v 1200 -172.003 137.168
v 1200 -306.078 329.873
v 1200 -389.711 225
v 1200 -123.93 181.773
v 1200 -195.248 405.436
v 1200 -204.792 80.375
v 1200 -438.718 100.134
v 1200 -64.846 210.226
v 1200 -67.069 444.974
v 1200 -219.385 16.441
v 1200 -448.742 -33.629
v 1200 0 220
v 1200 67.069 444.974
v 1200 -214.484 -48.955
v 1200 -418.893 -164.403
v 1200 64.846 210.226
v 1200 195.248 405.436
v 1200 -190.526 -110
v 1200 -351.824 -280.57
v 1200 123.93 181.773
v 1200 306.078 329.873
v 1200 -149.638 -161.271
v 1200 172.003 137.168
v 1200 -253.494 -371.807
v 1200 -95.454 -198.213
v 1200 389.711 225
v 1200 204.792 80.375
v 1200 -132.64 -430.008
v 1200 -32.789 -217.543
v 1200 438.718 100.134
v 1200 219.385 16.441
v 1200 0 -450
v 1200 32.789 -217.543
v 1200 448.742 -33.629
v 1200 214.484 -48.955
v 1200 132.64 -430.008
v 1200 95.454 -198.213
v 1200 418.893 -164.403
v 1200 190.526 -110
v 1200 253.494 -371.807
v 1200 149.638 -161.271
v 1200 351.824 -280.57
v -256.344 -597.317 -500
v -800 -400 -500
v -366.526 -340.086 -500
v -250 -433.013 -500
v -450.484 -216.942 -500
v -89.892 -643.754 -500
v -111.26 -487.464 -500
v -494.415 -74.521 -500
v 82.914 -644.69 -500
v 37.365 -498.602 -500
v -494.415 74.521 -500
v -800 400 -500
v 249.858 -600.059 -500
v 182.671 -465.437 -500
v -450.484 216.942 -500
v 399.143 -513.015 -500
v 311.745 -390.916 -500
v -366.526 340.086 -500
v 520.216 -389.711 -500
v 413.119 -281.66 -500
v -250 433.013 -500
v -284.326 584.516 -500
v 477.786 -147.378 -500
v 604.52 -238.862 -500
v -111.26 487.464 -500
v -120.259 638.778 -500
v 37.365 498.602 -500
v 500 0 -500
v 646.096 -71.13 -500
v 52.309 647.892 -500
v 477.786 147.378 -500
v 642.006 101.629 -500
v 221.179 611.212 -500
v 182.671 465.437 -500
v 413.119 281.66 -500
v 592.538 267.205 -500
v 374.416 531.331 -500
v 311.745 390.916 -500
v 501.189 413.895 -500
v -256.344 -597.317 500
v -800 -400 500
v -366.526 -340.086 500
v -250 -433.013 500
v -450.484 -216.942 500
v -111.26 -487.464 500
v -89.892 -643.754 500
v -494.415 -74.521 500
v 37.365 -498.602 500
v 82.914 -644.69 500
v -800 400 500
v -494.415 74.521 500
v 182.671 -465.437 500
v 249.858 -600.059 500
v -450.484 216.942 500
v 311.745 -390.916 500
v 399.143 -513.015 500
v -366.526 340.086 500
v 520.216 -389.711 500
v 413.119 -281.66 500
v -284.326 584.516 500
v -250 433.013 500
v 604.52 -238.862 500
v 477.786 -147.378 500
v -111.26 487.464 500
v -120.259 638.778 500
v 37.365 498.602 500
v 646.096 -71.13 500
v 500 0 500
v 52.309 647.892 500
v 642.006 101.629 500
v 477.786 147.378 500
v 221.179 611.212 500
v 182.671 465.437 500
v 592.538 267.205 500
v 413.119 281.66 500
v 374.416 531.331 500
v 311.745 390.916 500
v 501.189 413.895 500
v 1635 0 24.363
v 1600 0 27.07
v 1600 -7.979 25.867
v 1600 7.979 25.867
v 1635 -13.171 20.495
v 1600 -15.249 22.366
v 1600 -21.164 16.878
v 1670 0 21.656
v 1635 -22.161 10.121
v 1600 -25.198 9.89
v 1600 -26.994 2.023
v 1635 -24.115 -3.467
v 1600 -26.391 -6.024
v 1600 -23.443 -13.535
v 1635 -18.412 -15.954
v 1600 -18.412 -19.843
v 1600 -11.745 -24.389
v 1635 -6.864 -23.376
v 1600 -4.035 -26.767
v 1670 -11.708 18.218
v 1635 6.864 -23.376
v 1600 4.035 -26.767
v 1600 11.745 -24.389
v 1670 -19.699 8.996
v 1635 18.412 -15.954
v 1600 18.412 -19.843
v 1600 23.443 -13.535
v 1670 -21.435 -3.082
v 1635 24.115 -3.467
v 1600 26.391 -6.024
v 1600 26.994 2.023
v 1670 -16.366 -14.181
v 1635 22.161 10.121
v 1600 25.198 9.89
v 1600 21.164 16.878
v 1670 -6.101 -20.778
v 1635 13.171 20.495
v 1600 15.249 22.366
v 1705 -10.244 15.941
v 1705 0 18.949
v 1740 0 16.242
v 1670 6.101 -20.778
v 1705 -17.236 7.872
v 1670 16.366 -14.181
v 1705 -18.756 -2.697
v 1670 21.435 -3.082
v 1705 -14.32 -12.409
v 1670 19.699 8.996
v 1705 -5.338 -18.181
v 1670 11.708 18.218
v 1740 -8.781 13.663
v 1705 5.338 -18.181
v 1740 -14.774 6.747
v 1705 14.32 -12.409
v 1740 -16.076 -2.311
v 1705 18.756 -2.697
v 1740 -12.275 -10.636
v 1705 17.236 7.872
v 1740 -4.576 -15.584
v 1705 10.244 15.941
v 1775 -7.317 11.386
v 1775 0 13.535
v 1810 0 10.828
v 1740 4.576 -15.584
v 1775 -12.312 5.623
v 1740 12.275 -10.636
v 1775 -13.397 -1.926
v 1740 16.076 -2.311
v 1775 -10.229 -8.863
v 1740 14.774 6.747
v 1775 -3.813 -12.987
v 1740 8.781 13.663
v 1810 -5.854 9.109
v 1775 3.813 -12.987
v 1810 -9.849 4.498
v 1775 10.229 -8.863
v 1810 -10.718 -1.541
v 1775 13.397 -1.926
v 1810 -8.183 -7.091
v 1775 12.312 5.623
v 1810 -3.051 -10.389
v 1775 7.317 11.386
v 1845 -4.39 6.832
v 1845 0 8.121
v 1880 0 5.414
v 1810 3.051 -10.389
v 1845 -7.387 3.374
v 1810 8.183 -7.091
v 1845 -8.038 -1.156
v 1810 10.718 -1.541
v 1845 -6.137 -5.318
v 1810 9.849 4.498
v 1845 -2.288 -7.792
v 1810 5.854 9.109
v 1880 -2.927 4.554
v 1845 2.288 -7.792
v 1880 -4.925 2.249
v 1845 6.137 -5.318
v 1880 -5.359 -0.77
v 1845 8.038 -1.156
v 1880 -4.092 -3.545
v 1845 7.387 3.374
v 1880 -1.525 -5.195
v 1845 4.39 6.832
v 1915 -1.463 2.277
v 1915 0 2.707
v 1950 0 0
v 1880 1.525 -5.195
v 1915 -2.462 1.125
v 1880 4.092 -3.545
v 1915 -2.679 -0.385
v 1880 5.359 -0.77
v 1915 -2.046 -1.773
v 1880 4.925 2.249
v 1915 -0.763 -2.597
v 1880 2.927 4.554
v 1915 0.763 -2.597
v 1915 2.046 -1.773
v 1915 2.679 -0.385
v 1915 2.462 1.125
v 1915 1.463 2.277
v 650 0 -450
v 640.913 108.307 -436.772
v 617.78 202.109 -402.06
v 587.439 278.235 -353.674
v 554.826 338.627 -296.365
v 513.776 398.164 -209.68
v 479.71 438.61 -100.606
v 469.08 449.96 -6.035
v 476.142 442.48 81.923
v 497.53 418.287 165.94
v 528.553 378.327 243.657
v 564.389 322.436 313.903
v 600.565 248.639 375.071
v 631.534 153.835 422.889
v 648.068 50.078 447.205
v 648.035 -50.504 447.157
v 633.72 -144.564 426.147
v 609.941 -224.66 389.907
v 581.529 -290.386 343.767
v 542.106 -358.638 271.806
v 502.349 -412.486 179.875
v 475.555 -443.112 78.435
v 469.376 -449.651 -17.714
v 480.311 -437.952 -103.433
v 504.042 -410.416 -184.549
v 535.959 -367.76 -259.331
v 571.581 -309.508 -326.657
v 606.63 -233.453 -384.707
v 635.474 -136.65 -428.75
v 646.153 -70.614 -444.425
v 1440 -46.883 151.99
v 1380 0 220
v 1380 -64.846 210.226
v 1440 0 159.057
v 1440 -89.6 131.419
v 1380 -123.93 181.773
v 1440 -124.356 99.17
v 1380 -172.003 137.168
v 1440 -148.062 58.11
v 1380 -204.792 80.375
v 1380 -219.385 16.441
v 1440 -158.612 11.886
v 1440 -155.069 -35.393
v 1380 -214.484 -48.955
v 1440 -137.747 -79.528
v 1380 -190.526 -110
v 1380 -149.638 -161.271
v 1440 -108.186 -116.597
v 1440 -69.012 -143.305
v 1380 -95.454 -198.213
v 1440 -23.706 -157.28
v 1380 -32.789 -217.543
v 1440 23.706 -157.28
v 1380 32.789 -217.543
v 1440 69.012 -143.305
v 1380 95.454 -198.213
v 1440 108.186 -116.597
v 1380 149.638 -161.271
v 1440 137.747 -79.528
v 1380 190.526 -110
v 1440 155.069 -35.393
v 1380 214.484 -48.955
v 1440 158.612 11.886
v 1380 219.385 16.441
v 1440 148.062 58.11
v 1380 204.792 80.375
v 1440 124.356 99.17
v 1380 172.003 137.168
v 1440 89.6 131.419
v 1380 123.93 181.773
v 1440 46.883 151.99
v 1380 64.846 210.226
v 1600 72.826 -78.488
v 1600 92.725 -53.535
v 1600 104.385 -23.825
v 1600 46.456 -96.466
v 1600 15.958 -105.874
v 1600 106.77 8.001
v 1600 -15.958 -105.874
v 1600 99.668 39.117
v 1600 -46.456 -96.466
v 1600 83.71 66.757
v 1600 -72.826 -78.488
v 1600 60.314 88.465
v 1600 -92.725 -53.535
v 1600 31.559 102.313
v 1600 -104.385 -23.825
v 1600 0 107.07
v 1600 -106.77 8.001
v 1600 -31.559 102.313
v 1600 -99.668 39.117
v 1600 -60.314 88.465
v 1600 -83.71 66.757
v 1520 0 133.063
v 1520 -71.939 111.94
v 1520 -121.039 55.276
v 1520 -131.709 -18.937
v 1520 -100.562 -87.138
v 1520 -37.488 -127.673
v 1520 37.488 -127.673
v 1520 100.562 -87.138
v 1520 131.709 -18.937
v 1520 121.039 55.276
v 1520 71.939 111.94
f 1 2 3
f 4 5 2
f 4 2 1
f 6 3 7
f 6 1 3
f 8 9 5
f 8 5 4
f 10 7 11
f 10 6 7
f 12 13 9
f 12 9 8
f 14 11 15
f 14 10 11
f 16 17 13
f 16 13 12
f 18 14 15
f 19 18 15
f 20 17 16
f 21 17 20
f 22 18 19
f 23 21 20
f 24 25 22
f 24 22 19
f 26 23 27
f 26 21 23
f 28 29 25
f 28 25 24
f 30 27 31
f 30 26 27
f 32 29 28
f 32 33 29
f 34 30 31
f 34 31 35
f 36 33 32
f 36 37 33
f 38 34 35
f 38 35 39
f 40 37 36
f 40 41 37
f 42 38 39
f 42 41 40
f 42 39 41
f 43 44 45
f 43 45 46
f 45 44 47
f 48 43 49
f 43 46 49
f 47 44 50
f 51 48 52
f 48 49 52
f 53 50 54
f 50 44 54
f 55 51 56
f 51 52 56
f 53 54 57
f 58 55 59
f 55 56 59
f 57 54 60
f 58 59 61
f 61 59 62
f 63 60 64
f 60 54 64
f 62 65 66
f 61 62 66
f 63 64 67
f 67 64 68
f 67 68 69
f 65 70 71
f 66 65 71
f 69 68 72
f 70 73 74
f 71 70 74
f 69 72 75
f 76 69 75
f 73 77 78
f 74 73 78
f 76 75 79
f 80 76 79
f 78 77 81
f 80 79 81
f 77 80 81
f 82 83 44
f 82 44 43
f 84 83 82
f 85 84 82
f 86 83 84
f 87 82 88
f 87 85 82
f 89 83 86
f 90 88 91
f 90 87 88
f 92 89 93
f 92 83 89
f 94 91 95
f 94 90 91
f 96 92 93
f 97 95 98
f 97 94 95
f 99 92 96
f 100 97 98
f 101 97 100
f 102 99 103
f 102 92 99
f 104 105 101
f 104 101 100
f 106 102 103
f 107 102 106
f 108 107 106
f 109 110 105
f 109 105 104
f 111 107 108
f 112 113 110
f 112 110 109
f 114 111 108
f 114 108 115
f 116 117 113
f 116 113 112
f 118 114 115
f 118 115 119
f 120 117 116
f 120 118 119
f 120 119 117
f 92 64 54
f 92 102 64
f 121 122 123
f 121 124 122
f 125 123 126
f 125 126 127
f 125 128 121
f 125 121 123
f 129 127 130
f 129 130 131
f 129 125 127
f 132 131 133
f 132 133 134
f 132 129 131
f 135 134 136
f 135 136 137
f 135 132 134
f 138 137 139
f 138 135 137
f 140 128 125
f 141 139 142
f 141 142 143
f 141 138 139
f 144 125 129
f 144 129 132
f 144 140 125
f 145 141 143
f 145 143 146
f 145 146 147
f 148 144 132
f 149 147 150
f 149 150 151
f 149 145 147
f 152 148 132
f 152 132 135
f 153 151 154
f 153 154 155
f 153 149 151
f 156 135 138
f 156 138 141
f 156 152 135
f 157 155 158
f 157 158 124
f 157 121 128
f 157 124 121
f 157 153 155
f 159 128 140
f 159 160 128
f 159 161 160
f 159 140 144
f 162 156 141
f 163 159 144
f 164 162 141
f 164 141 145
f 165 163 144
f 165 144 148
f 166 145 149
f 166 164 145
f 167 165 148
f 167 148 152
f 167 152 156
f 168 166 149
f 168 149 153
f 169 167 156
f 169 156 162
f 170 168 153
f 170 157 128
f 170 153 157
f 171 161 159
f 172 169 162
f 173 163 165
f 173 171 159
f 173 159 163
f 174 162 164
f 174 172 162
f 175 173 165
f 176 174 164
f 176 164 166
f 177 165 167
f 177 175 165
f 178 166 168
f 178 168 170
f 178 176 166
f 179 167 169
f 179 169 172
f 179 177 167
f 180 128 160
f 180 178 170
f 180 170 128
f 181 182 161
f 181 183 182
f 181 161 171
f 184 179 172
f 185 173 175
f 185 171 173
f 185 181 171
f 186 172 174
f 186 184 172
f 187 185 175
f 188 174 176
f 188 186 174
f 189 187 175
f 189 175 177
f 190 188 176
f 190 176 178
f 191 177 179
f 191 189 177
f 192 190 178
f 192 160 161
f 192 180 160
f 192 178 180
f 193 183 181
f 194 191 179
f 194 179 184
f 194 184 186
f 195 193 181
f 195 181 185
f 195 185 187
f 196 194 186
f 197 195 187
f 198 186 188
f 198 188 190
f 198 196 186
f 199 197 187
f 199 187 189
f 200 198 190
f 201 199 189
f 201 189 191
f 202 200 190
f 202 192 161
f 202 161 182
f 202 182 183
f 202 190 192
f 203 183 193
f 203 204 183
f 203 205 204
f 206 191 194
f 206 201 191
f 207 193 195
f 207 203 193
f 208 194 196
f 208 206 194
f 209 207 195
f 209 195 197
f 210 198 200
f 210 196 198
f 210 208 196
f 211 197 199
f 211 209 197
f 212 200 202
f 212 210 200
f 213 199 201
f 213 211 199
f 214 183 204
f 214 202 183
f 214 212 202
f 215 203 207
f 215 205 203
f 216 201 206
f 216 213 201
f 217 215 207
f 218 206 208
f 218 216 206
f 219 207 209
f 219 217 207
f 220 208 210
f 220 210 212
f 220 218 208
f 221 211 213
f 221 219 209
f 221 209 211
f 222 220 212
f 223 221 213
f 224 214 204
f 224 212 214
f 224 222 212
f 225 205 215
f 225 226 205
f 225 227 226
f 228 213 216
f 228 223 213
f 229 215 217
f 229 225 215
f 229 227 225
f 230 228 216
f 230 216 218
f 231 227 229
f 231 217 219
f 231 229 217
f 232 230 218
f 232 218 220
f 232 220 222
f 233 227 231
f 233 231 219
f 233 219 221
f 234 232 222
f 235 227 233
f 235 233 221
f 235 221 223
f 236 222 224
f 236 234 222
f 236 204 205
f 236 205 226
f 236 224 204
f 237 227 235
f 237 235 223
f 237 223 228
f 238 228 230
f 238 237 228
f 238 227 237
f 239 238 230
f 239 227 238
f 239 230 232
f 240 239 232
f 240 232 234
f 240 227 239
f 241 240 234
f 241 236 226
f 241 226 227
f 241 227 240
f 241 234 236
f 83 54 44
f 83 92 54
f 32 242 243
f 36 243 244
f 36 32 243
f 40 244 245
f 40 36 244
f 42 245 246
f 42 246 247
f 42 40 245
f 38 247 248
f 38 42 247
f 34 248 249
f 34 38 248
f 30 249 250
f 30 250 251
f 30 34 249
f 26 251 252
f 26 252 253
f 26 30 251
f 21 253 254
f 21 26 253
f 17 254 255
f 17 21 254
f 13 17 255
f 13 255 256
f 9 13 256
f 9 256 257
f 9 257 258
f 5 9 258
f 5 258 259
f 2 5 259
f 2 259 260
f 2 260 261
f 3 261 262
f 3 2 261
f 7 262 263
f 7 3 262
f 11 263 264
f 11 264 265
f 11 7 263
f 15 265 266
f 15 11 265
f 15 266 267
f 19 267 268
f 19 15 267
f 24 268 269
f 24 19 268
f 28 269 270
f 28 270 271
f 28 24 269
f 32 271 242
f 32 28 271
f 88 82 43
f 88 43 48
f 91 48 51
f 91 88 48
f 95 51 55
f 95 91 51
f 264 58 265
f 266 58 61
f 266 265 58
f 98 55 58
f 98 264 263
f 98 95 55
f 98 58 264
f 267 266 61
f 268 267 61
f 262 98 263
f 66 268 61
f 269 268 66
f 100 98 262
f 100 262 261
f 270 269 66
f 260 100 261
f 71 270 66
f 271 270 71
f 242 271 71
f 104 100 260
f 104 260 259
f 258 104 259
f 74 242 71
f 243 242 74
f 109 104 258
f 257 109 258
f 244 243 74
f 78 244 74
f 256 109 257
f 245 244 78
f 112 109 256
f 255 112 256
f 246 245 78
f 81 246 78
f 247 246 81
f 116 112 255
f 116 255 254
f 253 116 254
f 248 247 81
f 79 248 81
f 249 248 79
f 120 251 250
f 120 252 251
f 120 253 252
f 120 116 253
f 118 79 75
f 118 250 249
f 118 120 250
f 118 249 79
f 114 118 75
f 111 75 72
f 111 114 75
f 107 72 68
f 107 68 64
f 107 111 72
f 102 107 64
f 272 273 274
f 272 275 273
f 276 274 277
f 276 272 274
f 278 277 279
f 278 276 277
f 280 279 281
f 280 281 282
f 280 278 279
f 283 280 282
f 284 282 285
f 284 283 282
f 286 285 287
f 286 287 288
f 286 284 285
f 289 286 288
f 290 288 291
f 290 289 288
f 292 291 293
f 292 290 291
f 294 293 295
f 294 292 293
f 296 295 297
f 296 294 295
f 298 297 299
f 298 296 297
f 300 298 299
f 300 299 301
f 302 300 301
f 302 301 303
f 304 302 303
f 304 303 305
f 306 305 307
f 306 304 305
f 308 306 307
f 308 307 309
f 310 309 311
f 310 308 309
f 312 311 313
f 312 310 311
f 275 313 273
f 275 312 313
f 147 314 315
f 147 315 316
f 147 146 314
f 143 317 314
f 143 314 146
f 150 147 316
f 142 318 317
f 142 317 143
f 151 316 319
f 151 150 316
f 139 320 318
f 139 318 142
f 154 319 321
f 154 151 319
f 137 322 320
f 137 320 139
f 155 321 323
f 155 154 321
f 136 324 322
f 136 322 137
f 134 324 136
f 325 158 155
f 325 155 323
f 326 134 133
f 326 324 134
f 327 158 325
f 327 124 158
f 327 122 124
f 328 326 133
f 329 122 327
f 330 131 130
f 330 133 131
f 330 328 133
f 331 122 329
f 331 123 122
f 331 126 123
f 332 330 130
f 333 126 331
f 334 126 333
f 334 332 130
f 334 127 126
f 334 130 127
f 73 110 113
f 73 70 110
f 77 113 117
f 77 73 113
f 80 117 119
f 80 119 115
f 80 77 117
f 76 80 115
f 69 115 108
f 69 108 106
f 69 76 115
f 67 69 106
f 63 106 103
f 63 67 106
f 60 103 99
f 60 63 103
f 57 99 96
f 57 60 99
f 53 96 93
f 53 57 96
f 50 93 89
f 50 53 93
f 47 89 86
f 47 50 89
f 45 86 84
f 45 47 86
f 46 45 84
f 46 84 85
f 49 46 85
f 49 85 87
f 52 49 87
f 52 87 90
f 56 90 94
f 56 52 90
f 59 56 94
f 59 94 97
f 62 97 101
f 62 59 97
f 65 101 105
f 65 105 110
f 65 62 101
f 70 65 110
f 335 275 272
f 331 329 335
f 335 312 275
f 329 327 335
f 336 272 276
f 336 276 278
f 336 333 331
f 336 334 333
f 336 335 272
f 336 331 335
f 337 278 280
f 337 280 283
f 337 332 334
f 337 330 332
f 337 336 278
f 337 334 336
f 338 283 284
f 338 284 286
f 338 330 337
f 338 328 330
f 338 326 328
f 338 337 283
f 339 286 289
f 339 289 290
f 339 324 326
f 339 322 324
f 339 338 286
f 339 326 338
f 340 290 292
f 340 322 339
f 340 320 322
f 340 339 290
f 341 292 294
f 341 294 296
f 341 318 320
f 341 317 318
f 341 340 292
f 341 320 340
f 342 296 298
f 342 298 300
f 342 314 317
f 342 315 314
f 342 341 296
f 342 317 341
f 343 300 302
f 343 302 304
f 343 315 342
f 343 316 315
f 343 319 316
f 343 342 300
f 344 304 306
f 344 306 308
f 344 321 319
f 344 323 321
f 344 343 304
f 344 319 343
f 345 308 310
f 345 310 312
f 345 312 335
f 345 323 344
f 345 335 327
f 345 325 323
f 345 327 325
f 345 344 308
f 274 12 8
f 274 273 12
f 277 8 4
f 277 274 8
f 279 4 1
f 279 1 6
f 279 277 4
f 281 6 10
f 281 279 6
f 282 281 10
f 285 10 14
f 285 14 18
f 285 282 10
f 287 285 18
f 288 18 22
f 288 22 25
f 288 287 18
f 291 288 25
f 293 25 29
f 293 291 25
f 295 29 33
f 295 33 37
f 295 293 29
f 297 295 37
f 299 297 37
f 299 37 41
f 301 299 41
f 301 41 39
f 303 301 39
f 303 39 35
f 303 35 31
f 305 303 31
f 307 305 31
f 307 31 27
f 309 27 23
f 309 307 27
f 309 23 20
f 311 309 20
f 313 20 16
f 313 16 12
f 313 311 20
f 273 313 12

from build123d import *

# Parameters (mm, degrees)
SKETCH1_R                = 500
BOSS_EXTRUDE1_DEPTH      = 500
BOSS_EXTRUDE2_REACH      = 2163.597
BOSS_EXTRUDE2_END_RADIUS = 650
SKETCH2_R                = 450


with BuildPart() as part:
    # Sketch1 → Boss-Extrude1 (new, symmetric)
    with BuildSketch(Plane.XY):
        with BuildLine():
            Line((-800, 400), (-800, -400))
            Line((-800, -400), (-256.343570219, -597.317314338))
            ThreePointArc((-256.343570219, -597.317314338), (649.817878656, 15.385856465), (-284.326048032, 584.515781147))
            Line((-284.326048032, 584.515781147), (-800, 400))
        make_face()
        Circle(SKETCH1_R, mode=Mode.SUBTRACT)
    extrude(amount=BOSS_EXTRUDE1_DEPTH, both=True)

    # Boss-Extrude2: up to this cylinder (the profile starts outside it)
    boss_extrude2_end = Plane(origin=(0, 0, 0), z_dir=(0, 0, -1)) * Cylinder(BOSS_EXTRUDE2_END_RADIUS, 5628.194, mode=Mode.PRIVATE)
    # Sketch2 → Boss-Extrude2 (add, up to the surface)
    with BuildSketch(Plane(origin=(1200, 0, 0), x_dir=(0, 0, -1), z_dir=(1, 0, 0)), mode=Mode.PRIVATE) as boss_extrude2_sk1:
        Circle(SKETCH2_R)
    boss_extrude2_tool1 = extrude(boss_extrude2_sk1.sketch, amount=-BOSS_EXTRUDE2_REACH, mode=Mode.PRIVATE) - boss_extrude2_end
    add(boss_extrude2_tool1.solids().sort_by_distance((1200, 0, 0))[0])

    # Sketch3 → Revolve2 (revolve)
    with BuildSketch(Plane.XY, mode=Mode.PRIVATE) as revolve2_sk:
        Polygon((1200, 0), (1200, -220), (1380, -220), (1440, -159.056741035), (1600, -107.069589638), (1600, -27.069589638), (1950, 0), align=None)
    revolve(revolve2_sk.sketch.rotate(Axis((0, 0, 0), (1, 0, 0)), 270), axis=Axis((0, 0, 0), (1, 0, 0)))


solid = part.part
